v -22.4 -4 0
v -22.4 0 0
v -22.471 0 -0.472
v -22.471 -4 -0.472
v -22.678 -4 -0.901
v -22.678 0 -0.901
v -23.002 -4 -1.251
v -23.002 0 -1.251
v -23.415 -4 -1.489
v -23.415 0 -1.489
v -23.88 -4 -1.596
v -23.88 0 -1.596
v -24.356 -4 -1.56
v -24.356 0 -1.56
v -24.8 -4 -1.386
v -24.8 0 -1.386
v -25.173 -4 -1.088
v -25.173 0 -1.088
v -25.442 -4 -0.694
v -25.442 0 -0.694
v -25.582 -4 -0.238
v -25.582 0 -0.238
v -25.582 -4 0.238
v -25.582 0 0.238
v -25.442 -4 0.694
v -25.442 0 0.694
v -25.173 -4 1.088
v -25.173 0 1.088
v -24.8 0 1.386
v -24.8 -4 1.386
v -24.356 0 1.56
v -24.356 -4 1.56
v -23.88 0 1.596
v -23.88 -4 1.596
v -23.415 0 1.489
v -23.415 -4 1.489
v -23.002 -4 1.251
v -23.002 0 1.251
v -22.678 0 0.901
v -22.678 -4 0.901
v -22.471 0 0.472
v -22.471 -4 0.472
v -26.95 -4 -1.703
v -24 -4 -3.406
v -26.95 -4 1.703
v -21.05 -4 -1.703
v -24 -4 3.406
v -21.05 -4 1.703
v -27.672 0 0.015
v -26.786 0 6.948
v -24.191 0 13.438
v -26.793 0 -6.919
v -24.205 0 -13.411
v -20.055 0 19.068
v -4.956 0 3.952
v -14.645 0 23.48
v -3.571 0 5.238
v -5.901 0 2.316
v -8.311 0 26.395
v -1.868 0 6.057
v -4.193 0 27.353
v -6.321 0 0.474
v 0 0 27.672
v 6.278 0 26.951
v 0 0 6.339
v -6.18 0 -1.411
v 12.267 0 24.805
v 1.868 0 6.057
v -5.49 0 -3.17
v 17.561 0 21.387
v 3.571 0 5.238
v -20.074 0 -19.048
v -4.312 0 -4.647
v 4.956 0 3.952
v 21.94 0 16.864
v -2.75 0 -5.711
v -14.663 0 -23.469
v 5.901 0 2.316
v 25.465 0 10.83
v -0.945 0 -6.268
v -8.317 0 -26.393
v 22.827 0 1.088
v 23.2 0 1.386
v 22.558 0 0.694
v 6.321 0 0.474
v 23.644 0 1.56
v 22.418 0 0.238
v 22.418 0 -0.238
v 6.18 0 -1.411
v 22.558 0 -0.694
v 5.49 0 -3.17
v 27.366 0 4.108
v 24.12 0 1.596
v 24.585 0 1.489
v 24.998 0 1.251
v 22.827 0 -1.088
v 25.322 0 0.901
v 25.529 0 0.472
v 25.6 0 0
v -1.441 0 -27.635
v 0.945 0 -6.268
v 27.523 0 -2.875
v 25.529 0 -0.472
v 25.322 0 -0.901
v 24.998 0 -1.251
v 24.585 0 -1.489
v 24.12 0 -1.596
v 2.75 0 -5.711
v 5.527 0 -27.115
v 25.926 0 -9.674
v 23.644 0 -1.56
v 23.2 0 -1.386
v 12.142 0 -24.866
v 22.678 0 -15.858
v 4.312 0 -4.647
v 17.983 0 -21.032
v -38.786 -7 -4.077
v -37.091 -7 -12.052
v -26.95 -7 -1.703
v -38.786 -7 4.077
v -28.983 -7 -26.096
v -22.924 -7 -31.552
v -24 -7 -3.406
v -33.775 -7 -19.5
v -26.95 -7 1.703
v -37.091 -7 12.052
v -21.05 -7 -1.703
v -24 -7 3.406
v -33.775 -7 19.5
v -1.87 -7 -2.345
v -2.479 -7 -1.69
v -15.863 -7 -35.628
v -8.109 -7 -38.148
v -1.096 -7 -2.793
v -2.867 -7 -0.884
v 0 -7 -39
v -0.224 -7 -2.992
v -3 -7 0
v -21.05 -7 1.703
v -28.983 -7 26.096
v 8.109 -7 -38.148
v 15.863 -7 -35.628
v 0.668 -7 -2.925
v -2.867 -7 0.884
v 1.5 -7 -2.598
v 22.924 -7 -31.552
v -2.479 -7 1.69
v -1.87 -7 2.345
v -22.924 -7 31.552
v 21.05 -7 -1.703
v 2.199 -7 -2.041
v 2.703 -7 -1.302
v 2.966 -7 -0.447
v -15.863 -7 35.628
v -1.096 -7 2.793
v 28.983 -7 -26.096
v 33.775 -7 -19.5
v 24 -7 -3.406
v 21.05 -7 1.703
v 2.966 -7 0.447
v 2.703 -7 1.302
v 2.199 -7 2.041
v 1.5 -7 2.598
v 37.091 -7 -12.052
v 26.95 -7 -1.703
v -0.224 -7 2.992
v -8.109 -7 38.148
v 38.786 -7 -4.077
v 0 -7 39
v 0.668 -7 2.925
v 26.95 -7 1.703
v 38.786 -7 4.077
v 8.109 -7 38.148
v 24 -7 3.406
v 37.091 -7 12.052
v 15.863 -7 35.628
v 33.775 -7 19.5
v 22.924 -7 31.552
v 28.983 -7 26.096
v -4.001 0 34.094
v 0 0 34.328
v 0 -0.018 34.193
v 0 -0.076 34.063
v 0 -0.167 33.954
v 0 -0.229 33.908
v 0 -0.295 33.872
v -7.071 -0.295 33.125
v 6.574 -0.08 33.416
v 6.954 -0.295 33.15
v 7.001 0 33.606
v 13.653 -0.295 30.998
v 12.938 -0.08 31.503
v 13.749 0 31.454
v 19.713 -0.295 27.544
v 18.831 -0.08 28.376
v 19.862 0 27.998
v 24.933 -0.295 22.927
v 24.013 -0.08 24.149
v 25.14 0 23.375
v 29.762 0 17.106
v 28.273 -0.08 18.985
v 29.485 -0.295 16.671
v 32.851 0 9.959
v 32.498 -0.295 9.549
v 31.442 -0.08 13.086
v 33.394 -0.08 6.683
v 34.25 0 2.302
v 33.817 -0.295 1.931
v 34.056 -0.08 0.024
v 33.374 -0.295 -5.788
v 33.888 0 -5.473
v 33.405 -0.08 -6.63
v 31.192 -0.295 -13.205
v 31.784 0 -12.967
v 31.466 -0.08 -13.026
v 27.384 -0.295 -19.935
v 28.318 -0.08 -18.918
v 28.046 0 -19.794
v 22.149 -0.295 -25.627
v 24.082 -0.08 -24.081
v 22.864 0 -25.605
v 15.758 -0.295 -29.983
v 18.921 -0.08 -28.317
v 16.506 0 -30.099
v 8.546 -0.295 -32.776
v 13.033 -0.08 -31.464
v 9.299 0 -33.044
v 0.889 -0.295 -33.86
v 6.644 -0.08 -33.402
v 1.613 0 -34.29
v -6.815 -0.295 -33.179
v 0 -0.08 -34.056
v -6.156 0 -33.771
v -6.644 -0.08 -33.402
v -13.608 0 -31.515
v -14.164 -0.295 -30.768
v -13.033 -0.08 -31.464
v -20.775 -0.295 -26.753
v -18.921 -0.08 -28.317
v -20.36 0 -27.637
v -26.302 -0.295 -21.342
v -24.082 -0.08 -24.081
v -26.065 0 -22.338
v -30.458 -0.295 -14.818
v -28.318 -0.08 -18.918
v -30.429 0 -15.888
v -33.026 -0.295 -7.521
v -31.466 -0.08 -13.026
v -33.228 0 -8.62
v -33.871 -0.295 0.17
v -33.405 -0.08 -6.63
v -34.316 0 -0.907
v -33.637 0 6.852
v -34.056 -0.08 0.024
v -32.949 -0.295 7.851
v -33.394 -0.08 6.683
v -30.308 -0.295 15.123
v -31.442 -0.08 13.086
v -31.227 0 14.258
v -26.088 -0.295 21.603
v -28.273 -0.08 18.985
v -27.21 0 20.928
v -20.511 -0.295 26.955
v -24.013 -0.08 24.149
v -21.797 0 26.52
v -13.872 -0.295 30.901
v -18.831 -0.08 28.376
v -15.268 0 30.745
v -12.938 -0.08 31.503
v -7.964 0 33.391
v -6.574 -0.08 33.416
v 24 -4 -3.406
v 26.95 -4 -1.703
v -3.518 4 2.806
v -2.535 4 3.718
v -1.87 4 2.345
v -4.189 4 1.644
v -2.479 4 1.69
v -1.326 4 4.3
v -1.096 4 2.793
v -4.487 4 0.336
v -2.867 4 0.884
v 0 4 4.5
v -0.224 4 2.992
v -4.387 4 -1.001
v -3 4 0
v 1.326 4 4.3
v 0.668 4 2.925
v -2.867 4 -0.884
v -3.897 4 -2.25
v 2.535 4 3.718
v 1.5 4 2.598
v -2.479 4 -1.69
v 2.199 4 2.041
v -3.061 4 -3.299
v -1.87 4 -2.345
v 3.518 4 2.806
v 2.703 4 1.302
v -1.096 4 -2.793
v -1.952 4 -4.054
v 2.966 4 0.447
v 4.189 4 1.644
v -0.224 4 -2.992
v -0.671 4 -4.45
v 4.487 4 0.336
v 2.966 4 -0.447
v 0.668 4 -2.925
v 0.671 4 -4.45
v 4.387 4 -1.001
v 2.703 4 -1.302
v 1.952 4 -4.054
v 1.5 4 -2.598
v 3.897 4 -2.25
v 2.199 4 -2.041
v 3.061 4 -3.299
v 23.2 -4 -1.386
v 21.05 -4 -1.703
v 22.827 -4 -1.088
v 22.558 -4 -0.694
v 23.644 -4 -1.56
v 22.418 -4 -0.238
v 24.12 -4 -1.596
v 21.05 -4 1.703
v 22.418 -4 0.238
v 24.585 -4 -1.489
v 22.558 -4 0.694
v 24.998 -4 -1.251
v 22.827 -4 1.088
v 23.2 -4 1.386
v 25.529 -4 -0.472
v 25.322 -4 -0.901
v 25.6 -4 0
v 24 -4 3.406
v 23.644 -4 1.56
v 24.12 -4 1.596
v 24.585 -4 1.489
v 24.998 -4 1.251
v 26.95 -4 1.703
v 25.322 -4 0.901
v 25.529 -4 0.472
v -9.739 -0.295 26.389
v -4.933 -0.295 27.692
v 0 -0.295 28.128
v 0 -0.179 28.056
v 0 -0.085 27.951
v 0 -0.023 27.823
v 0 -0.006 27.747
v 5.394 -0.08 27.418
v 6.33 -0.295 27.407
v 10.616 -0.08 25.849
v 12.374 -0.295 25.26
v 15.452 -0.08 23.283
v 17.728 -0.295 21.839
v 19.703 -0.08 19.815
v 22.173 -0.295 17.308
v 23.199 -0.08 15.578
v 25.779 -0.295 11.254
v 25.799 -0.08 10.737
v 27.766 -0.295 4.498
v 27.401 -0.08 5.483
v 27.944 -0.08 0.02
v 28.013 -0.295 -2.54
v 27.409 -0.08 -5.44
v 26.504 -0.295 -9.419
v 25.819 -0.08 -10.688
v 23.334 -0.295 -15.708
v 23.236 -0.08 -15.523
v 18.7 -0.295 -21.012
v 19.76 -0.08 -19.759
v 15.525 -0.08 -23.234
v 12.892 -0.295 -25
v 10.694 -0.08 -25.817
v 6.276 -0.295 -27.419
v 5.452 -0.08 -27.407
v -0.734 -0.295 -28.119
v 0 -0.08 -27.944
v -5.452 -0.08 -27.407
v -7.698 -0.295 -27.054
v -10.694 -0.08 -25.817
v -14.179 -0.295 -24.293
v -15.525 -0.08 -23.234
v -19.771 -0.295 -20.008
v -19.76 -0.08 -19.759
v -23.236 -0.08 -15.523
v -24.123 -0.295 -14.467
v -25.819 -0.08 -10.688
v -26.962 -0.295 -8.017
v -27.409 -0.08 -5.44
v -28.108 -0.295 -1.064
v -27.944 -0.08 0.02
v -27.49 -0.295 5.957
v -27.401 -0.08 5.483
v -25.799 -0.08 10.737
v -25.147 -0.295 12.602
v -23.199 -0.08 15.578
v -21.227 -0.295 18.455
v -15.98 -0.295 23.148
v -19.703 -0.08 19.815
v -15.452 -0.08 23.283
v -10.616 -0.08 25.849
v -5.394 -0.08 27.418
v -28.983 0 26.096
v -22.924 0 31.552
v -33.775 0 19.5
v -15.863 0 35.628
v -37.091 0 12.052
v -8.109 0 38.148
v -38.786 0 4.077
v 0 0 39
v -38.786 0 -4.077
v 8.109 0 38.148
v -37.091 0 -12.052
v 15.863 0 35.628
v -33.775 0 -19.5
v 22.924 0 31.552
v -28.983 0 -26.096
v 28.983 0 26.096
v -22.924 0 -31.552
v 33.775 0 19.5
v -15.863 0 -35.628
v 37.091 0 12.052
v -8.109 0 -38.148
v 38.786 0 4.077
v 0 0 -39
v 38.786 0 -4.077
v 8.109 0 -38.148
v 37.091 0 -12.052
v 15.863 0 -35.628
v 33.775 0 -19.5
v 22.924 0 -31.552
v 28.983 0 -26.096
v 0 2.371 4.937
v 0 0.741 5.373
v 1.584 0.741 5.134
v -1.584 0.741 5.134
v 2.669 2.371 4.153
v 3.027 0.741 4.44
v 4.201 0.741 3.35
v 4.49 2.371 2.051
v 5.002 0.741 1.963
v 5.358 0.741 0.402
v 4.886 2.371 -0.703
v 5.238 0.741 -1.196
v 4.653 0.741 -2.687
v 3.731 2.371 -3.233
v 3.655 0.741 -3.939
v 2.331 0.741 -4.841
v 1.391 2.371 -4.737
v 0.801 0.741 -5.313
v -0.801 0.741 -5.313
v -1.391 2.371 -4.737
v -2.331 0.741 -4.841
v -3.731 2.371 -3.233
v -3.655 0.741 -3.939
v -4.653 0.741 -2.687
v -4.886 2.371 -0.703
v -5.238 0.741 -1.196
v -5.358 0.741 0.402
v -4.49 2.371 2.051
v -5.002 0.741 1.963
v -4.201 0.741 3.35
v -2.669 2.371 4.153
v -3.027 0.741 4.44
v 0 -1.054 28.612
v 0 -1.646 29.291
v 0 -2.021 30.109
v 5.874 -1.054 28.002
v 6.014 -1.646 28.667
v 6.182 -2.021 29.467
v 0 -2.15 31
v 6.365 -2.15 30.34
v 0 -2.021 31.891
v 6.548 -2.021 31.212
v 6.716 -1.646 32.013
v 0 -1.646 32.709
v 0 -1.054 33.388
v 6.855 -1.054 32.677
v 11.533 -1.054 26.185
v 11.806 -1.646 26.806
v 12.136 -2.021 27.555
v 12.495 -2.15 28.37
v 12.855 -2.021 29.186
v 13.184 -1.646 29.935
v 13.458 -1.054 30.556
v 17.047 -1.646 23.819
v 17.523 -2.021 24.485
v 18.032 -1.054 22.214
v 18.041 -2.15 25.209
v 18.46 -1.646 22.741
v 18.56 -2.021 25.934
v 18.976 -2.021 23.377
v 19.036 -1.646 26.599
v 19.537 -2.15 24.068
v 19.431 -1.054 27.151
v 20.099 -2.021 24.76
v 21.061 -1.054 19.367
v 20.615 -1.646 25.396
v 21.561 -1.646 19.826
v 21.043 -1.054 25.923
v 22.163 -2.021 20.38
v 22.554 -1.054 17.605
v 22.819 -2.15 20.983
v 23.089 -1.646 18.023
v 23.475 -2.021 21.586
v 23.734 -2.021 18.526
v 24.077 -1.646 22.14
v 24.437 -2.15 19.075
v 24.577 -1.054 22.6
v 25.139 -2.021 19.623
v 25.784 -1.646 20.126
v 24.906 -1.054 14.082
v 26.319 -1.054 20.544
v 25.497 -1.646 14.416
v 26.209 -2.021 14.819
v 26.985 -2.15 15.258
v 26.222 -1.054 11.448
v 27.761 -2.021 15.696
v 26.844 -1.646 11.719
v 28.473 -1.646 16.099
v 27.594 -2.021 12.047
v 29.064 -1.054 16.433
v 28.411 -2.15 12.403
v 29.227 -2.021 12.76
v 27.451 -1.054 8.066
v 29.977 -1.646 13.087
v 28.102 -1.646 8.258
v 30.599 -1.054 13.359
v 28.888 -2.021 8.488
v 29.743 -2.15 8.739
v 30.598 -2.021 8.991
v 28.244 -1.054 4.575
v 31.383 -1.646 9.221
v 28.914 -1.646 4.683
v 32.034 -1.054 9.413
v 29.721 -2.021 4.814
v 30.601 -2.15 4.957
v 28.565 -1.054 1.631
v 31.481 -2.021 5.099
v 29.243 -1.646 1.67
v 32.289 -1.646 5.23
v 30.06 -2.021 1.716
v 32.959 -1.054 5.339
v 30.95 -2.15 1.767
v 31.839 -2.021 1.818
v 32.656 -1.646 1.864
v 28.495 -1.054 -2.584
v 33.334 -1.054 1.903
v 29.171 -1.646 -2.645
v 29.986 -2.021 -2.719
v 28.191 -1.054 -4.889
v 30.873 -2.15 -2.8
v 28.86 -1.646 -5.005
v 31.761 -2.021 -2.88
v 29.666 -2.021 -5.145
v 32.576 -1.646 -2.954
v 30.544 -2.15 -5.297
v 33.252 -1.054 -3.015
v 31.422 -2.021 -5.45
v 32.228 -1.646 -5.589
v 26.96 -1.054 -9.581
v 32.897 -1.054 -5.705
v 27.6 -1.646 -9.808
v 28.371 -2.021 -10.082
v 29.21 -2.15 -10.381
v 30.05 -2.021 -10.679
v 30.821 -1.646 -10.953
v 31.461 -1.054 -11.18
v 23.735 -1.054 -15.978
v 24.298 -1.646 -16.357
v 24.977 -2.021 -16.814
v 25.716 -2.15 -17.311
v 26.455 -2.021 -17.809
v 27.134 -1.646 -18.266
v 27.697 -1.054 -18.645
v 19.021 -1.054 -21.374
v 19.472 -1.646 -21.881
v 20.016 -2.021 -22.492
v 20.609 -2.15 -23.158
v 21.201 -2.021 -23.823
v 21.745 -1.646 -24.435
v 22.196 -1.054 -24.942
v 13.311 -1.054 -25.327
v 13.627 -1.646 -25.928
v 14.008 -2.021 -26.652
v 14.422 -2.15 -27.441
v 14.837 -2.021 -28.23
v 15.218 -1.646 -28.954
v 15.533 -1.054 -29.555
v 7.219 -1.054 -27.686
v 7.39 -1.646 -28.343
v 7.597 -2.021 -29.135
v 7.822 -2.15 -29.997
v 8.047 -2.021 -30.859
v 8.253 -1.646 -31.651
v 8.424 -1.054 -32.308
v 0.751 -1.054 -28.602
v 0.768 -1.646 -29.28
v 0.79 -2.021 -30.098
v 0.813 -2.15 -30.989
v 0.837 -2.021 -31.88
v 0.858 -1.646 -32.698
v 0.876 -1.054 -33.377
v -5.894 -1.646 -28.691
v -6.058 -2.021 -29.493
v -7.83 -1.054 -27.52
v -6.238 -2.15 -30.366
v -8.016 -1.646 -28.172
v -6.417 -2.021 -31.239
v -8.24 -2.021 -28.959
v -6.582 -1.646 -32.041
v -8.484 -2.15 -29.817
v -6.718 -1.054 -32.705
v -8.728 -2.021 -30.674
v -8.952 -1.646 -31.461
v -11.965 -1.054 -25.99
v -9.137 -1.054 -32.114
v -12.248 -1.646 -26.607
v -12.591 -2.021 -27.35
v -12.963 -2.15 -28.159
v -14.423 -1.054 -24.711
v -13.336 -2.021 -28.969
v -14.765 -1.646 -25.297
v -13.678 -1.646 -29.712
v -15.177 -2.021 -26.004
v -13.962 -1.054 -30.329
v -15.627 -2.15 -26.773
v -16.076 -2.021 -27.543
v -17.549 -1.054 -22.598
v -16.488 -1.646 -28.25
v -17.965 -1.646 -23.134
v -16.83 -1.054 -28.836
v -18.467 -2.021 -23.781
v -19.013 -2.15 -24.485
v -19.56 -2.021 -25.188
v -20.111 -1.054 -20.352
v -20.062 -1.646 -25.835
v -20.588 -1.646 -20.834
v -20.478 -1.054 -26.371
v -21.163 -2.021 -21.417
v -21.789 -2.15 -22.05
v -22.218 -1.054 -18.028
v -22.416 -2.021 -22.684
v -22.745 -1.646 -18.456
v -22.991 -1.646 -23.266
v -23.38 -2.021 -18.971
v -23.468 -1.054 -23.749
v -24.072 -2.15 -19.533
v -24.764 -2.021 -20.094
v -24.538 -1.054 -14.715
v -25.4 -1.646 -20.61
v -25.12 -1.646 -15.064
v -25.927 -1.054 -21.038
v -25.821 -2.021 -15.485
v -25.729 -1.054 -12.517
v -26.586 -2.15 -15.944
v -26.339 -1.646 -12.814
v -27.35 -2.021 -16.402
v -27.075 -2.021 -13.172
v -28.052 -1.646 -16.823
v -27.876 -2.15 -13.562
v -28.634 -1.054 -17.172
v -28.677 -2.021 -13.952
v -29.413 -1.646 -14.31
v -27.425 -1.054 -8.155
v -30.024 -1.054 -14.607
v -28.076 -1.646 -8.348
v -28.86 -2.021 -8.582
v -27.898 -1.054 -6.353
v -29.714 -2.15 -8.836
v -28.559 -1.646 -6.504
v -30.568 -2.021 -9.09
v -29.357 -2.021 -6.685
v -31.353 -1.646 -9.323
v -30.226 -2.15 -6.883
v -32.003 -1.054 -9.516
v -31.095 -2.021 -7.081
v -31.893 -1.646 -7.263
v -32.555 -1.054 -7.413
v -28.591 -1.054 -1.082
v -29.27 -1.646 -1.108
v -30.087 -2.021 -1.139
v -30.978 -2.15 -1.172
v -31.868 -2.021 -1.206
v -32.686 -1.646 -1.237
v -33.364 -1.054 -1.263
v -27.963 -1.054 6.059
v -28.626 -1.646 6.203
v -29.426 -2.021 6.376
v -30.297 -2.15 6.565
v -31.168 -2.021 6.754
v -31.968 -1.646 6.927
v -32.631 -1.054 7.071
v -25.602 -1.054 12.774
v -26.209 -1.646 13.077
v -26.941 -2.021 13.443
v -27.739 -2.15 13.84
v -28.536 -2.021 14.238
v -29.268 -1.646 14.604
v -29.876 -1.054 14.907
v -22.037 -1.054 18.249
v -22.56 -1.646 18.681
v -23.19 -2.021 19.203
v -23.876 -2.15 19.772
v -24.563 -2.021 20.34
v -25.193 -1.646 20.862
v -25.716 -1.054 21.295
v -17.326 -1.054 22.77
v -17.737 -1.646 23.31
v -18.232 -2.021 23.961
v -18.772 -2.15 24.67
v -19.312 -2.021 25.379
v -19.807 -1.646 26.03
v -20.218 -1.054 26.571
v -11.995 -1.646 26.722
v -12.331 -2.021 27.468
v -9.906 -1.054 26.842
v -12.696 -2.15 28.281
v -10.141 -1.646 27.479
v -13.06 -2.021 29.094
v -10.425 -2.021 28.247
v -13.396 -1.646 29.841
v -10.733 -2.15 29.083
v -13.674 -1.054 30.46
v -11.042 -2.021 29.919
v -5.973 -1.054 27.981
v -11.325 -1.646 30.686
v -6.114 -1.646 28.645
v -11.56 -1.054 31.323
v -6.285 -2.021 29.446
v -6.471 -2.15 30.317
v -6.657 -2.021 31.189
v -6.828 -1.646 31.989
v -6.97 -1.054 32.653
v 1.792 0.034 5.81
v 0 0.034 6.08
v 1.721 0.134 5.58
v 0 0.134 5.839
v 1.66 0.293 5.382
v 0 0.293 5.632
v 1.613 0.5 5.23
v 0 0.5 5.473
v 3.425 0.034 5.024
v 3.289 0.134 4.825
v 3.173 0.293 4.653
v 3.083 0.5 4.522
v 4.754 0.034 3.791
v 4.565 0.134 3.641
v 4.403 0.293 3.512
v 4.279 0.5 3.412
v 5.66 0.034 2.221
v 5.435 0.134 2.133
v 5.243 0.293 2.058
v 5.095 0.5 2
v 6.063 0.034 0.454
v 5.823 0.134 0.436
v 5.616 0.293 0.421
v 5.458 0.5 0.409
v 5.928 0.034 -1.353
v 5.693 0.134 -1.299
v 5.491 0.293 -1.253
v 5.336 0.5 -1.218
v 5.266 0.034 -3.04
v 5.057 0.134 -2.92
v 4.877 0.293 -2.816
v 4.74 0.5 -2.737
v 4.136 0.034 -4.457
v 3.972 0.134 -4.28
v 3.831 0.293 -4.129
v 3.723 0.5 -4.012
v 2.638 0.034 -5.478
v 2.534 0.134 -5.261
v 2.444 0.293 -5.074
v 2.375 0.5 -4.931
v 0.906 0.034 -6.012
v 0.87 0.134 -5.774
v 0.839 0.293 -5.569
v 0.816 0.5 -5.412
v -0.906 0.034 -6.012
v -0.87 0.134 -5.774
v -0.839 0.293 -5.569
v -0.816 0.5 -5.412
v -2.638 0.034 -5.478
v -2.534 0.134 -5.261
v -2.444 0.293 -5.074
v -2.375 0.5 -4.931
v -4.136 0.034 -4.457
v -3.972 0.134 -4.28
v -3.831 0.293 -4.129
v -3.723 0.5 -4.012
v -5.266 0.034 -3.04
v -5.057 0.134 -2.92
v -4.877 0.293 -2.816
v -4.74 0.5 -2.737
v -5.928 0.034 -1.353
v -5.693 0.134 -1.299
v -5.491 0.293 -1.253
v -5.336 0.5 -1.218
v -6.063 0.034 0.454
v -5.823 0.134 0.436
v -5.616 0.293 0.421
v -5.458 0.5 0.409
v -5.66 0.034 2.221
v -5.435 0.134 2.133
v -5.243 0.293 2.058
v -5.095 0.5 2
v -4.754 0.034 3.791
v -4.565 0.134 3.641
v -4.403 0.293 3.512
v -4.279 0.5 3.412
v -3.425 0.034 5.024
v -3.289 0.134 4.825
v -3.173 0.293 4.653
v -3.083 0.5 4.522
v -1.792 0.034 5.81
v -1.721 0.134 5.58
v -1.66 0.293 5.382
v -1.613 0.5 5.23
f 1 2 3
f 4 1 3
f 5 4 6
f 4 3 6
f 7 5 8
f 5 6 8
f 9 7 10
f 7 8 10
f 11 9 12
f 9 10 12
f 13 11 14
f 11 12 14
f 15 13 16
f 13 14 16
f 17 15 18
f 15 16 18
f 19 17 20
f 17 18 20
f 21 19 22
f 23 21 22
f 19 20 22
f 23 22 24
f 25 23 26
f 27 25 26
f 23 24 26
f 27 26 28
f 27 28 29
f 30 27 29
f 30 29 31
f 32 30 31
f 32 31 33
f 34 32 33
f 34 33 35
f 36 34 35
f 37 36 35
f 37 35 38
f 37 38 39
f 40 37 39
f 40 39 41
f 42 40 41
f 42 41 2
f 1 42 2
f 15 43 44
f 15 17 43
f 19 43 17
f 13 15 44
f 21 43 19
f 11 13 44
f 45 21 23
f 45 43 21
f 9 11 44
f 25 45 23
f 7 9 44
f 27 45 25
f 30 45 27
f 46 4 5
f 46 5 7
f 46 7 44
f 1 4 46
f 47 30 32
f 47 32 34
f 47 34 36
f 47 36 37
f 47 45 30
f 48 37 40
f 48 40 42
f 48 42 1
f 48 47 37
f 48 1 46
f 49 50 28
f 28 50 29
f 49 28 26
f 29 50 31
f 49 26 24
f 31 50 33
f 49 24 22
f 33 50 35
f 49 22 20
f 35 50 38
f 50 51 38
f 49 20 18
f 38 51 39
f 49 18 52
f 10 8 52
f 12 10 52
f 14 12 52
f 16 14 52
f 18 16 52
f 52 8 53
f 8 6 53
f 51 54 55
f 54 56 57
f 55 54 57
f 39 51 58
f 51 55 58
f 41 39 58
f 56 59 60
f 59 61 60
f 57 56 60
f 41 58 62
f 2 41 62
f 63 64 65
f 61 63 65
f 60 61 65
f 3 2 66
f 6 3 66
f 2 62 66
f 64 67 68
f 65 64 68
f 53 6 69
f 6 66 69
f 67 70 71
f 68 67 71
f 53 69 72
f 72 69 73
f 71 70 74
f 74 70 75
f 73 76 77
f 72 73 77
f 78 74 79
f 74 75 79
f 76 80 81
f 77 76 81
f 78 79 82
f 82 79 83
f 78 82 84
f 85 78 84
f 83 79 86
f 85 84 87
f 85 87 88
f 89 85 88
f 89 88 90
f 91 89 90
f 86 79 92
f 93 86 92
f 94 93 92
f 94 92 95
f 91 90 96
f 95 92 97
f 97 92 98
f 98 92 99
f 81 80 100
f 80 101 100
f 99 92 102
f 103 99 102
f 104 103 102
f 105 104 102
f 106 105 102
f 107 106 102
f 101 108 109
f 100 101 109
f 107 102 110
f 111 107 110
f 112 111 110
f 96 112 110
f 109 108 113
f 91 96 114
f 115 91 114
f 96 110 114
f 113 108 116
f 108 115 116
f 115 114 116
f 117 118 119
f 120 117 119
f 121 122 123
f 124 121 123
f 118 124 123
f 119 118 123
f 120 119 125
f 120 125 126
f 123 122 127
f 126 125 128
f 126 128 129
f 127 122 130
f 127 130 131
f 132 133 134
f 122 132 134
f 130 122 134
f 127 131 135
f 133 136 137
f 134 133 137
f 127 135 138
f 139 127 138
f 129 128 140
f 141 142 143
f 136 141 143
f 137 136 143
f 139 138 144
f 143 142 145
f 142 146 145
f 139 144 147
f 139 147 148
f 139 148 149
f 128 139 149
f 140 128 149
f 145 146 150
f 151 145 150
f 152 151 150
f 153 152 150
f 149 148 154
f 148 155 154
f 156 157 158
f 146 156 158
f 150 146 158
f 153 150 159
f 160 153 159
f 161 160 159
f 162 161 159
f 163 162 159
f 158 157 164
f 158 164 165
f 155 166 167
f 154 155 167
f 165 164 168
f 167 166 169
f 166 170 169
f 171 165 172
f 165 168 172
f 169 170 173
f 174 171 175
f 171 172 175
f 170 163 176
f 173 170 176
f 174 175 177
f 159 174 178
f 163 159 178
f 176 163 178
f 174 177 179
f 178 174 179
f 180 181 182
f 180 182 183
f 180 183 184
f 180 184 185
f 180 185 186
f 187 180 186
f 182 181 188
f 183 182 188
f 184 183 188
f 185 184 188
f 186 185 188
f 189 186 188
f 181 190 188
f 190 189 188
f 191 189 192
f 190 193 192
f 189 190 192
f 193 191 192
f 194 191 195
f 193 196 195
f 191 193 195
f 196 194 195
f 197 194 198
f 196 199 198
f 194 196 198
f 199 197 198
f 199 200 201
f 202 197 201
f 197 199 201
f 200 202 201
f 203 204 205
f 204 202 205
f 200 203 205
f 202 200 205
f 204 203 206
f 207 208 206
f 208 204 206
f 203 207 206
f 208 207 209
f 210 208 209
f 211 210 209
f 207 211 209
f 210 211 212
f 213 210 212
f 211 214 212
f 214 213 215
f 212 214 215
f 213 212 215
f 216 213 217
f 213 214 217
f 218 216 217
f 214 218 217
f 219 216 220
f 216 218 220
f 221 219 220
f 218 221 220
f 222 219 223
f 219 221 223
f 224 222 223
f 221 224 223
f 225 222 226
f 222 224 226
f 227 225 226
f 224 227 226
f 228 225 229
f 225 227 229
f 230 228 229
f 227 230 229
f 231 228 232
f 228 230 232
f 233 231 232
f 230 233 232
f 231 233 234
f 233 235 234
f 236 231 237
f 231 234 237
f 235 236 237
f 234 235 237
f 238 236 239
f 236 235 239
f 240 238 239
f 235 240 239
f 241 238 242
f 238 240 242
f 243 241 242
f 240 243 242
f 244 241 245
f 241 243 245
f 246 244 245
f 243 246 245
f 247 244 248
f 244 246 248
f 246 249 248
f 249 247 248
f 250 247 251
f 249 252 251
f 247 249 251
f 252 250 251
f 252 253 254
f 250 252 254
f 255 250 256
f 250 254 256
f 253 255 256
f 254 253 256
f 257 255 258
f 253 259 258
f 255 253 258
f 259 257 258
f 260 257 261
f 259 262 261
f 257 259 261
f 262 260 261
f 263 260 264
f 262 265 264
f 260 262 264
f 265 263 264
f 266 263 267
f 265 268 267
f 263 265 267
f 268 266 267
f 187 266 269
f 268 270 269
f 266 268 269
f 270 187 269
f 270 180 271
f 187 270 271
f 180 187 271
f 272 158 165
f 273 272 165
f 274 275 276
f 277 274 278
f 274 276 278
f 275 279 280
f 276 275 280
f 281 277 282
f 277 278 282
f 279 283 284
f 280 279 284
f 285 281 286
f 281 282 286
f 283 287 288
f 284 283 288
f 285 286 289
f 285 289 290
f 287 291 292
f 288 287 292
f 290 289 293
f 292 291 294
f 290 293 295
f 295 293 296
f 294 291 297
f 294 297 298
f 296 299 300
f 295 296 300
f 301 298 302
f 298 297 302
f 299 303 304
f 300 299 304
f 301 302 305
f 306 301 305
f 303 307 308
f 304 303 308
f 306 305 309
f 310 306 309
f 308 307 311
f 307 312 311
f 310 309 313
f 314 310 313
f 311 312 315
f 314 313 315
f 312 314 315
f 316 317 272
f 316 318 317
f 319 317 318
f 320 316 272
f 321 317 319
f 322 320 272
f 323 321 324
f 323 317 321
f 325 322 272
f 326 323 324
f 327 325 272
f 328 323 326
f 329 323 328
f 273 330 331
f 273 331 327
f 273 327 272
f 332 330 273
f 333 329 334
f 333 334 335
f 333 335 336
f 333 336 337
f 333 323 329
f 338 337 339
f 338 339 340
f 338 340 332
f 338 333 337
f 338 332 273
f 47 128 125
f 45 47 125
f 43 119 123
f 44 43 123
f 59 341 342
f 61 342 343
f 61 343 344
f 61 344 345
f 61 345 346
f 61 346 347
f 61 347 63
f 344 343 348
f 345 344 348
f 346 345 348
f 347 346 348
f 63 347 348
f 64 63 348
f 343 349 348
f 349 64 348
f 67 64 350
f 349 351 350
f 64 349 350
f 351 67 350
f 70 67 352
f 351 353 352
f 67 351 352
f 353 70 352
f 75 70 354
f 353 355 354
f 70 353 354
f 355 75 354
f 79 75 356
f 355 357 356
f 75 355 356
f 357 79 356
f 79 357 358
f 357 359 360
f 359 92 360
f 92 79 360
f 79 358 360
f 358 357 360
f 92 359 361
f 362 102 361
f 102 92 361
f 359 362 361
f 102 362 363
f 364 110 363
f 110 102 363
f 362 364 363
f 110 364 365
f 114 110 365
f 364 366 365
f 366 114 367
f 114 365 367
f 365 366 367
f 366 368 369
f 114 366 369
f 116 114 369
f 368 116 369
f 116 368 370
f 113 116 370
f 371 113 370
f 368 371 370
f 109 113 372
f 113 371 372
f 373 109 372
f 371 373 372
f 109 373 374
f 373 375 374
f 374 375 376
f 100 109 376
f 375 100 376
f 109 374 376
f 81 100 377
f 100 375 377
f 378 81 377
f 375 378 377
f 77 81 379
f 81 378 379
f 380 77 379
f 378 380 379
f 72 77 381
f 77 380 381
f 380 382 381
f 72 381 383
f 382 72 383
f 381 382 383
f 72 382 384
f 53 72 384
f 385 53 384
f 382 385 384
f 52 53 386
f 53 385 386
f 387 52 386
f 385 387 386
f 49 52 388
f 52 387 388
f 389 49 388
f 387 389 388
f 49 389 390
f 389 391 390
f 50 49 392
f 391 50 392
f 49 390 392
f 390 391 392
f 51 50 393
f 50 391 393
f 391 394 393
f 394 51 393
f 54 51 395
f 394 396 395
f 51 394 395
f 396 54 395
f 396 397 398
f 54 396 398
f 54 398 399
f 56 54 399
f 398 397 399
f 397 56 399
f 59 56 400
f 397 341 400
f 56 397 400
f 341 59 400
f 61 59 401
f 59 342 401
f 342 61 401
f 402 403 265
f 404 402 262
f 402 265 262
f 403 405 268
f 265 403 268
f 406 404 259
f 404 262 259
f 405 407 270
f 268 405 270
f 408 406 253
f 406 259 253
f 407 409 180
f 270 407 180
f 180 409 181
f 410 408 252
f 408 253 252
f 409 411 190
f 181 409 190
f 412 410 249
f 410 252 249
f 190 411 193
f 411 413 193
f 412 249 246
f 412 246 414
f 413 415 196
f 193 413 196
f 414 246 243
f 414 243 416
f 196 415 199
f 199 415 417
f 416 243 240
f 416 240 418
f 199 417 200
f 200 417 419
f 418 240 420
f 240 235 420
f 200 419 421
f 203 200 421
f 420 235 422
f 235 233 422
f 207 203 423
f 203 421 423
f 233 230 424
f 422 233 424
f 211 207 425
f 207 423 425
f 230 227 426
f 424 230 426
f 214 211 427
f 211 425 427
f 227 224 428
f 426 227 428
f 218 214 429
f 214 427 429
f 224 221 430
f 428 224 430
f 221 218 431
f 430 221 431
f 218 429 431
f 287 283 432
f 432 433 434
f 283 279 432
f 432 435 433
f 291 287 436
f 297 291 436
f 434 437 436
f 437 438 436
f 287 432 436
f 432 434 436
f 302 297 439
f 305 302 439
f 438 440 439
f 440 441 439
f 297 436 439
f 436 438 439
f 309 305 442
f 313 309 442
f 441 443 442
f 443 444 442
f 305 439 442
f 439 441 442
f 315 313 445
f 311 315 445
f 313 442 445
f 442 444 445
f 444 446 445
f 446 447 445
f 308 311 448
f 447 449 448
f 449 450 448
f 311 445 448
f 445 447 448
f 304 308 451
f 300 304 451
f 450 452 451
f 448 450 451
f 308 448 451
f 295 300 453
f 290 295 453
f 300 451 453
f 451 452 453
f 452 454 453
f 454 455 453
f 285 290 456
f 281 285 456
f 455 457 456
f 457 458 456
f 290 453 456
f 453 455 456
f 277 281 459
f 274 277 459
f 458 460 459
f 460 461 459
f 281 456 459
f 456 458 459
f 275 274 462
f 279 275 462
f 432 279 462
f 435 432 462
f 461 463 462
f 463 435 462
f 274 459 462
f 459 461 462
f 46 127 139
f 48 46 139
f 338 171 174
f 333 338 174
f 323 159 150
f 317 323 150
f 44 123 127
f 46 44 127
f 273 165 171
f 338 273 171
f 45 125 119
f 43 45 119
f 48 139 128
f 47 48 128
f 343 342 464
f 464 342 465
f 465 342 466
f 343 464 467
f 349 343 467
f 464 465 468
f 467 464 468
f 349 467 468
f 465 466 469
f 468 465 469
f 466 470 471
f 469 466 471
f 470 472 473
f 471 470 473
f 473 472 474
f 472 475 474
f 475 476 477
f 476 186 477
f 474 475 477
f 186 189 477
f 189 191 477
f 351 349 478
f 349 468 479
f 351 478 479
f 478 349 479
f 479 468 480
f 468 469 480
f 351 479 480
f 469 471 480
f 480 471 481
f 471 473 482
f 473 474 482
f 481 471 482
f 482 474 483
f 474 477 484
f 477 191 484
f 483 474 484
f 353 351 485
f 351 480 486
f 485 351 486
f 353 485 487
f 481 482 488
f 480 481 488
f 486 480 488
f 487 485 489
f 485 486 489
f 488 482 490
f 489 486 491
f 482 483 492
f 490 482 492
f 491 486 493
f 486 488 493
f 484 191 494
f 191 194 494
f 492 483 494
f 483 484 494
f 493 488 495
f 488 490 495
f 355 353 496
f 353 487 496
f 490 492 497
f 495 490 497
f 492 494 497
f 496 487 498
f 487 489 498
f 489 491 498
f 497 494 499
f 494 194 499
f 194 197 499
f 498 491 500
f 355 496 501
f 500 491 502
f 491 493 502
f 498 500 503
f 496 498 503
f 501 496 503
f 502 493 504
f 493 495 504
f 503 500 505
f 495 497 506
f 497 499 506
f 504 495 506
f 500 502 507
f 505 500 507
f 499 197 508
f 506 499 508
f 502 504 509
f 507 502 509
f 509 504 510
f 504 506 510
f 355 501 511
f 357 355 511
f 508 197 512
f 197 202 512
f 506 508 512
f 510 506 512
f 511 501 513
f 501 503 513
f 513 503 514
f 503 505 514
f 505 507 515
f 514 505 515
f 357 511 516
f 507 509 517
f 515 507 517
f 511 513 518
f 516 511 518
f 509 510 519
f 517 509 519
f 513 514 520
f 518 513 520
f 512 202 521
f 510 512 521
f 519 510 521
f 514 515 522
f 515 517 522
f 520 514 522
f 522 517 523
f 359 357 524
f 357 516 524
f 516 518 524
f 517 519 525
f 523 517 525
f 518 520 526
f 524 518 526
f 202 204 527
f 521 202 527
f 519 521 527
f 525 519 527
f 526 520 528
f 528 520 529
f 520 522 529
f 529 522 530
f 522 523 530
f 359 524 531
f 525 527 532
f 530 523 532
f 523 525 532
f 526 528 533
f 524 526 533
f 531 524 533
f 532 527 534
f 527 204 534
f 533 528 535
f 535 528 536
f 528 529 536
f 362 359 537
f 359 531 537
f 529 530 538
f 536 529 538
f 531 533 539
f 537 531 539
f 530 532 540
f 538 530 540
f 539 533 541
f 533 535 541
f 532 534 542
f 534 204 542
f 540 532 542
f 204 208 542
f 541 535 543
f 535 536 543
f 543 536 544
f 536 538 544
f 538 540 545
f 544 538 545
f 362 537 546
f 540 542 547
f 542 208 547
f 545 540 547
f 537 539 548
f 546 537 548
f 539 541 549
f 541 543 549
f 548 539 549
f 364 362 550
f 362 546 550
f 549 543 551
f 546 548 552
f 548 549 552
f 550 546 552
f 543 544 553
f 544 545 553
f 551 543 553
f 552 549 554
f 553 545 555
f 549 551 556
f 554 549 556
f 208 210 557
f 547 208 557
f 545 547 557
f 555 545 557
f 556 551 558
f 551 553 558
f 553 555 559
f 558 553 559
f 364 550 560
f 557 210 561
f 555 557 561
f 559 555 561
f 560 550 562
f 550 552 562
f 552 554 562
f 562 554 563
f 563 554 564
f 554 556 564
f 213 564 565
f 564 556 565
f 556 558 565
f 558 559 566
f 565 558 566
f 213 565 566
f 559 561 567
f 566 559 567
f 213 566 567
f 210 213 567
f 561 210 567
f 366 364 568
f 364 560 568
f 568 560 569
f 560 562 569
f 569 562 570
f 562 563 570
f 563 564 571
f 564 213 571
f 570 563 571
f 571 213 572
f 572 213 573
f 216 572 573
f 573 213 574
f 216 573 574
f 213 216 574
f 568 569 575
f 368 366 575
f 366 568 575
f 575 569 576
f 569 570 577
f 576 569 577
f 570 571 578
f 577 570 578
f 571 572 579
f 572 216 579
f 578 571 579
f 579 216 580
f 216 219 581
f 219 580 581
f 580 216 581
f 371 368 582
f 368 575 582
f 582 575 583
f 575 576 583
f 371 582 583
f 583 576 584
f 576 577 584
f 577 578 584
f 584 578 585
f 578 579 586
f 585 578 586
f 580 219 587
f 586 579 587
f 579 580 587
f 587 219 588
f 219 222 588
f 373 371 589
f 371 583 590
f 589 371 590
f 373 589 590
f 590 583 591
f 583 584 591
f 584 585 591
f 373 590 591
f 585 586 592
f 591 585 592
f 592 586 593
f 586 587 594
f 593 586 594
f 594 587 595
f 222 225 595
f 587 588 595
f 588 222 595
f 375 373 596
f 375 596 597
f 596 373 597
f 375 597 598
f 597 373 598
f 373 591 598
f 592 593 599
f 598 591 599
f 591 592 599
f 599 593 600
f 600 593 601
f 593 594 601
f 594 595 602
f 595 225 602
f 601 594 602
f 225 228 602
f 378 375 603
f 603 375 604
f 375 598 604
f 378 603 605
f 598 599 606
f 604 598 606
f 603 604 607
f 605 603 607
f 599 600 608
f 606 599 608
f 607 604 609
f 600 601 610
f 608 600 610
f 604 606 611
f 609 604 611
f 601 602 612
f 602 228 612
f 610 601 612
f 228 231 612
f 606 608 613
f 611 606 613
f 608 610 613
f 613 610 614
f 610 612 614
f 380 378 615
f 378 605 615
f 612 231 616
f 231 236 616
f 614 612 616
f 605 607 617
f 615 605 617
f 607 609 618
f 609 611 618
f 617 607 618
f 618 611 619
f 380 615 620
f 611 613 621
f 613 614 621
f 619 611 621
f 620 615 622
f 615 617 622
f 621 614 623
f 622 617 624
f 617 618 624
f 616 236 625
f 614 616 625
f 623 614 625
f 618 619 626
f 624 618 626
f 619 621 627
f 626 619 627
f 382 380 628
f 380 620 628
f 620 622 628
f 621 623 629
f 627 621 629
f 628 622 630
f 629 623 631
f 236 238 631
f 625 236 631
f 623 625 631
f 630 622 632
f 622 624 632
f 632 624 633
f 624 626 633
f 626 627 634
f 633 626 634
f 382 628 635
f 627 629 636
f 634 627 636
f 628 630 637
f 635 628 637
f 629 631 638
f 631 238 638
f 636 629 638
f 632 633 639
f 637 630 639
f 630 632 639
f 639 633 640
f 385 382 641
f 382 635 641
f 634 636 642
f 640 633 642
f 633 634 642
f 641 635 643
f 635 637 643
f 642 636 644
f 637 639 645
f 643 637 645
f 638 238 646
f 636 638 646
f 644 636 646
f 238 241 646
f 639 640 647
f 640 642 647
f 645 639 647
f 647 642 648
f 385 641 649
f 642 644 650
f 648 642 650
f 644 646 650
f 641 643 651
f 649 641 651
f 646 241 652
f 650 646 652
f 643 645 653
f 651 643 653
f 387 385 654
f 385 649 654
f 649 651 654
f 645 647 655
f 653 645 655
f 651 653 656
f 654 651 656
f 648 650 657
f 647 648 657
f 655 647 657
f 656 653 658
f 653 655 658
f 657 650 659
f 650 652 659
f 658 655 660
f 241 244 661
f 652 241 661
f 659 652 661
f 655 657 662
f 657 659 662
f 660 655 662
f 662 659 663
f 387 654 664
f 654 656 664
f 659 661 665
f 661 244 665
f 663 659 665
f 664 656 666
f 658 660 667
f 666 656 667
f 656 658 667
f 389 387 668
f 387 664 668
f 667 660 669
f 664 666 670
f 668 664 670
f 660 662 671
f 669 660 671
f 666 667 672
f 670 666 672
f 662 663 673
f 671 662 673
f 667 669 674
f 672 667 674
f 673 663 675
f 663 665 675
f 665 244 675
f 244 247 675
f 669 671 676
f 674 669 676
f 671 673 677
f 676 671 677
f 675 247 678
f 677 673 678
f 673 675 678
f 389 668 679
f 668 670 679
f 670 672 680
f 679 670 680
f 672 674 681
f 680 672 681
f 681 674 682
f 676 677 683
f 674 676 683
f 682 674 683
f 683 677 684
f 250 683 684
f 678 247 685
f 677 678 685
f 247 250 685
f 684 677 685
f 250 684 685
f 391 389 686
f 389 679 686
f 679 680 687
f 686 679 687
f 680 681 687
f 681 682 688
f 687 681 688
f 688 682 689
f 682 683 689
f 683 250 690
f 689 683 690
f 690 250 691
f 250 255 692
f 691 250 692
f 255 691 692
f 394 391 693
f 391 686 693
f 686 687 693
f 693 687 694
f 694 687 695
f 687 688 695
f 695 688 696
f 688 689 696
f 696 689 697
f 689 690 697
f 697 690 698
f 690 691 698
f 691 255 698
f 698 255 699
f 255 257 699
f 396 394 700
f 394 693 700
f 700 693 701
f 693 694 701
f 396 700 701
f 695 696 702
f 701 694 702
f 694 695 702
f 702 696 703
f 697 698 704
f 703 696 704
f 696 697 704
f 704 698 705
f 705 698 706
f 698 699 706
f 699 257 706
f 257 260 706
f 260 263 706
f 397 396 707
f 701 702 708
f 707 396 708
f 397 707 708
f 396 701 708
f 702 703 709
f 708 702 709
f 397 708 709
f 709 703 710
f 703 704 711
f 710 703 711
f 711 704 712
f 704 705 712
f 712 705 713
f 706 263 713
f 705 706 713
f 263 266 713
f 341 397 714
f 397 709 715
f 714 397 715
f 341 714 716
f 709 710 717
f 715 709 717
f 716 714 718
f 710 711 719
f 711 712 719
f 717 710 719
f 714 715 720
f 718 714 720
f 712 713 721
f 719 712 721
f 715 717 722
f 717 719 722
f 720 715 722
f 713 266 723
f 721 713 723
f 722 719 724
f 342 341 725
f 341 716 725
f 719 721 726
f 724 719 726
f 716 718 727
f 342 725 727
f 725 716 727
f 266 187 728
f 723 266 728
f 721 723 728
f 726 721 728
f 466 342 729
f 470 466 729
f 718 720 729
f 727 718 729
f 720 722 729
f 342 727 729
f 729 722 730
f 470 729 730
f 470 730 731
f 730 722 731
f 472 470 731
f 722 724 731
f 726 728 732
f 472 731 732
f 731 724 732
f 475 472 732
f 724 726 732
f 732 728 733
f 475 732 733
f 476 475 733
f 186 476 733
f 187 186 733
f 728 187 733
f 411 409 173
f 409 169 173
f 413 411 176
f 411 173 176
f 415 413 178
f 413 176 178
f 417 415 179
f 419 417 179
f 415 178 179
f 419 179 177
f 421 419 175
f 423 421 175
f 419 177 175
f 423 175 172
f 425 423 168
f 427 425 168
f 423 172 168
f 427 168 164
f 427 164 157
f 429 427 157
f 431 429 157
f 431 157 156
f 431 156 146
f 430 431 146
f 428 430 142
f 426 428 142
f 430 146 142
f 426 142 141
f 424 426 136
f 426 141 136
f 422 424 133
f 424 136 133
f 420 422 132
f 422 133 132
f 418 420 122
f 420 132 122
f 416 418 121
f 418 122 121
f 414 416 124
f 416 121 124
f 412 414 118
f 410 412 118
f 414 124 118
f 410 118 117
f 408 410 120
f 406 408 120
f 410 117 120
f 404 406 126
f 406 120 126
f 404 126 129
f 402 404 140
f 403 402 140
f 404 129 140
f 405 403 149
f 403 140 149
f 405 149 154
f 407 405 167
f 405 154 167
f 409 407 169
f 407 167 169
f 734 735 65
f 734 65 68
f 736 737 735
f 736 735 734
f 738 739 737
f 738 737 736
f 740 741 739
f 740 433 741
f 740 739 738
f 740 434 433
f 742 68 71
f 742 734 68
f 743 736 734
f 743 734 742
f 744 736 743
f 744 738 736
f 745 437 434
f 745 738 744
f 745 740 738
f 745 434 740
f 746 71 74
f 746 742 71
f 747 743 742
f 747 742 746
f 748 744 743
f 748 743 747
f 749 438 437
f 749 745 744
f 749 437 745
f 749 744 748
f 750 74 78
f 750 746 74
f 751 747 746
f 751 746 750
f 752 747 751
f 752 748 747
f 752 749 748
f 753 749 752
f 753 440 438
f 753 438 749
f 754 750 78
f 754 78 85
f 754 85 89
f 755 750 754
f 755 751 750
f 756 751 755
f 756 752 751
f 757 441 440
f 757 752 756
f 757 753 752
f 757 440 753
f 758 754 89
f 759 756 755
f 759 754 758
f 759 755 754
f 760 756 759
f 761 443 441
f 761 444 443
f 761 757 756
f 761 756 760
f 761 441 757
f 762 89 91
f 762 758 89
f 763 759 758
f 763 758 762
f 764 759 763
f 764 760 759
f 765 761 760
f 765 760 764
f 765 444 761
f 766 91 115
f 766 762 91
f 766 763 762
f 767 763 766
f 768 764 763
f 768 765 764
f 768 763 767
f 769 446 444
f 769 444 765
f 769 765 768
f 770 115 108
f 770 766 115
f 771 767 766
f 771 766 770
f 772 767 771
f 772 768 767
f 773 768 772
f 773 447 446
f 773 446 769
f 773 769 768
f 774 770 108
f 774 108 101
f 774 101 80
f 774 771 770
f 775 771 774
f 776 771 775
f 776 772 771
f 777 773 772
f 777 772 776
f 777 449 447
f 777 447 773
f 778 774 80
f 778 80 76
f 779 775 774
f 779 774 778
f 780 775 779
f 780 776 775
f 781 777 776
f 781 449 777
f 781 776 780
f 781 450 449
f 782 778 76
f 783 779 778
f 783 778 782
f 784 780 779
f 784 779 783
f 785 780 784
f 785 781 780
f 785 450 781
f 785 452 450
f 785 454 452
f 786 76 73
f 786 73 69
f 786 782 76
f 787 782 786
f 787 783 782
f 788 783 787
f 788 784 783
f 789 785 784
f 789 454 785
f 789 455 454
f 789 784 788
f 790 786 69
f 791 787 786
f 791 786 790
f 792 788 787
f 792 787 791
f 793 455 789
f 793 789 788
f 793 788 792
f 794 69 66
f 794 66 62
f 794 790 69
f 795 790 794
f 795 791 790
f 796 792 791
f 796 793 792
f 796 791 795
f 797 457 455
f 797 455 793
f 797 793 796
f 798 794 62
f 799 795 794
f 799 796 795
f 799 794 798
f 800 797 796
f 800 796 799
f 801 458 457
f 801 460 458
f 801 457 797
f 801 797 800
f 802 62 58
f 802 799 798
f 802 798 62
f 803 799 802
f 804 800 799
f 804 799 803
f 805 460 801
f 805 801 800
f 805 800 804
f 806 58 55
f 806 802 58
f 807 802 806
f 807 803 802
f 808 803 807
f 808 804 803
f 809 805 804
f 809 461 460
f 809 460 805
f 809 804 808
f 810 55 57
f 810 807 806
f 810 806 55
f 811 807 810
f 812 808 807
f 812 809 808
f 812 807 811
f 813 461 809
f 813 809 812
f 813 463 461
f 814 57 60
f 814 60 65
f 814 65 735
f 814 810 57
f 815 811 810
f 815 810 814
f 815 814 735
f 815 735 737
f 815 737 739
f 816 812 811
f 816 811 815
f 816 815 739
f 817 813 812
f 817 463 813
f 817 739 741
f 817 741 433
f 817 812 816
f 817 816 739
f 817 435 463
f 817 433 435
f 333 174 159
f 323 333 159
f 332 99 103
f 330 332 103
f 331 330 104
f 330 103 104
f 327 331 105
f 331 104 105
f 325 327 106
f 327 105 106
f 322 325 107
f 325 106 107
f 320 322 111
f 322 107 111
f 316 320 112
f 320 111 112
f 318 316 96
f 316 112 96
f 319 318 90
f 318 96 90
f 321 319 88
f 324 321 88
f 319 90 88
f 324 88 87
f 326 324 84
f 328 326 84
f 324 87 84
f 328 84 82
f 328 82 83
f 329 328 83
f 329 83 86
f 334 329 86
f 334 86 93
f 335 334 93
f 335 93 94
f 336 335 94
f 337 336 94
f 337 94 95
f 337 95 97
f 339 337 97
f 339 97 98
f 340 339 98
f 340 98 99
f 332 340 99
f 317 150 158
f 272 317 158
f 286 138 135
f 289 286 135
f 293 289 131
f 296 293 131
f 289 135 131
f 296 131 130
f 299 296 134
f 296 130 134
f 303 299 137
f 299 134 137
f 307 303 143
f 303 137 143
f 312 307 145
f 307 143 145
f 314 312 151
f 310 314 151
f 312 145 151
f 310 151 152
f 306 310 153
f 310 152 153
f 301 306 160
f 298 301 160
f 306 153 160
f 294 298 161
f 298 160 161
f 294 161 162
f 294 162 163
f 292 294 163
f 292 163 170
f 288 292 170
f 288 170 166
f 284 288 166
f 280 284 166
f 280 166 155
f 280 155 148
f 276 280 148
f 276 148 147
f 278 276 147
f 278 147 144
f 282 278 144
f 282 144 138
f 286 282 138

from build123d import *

# Parameters (mm, degrees)
CUT_EXTRUDE26_DEPTH            = 3
CUT_EXTRUDE27_DEPTH            = 3
F_6_0_6_DIAMETER_HOLE1_D       = 6
F_3_2_3_2_DIAMETER_HOLE1_D     = 3.2
F_3_2_3_2_DIAMETER_HOLE1_DEPTH = 8
FILLET2_R                      = 0.5
FILLET3_R                      = 1


with BuildPart() as part:
    # Sketch1 → Revolve1 (revolve)
    with BuildSketch(Plane(origin=(0, 0, 0), x_dir=(-1, 0, 0), z_dir=(0, 0, -1))):
        with BuildLine():
            Line((-39, -7), (0, -7))
            Line((0, -7), (0, 0))
            Line((0, 0), (-28.012944594, 0))
            ThreePointArc((-28.012944594, 0), (-31, -2.15), (-33.987055406, 0))
            Line((-33.987055406, 0), (-39, 0))
            Line((-39, 0), (-39, -7))
        make_face()
    revolve(axis=Axis((0, -7, 0), (0, 1, 0)))

    # Sketch27 → Cut-Extrude26 (cut)
    with BuildSketch(Plane.XZ.offset(7)):
        Polygon((26.95, -1.703183294), (26.95, 1.703183294), (24, 3.406366588), (21.05, 1.703183294), (21.05, -1.703183294), (24, -3.406366588), align=None)
    extrude(amount=-CUT_EXTRUDE26_DEPTH, mode=Mode.SUBTRACT)

    # Sketch28 → Cut-Extrude27 (cut)
    with BuildSketch(Plane.XZ.offset(7)):
        Polygon((-21.05, 1.703183294), (-24, 3.406366588), (-26.95, 1.703183294), (-26.95, -1.703183294), (-24, -3.406366588), (-21.05, -1.703183294), align=None)
    extrude(amount=-CUT_EXTRUDE27_DEPTH, mode=Mode.SUBTRACT)

    # Sketch29 → Revolve2 (revolve)
    with BuildSketch(Plane(origin=(0, 0, 0), x_dir=(-1, 0, 0), z_dir=(0, 0, -1))):
        Polygon((-5.57179677, 0), (0, 0), (0, 4), (-4.5, 4), align=None)
    revolve(axis=Axis((0, 0, 0), (0, 1, 0)))

    # Ø6.0 (6) Diameter Hole1 (through all)
    with Locations(Plane(origin=(0, 4, 0), x_dir=(1, 0, 0), z_dir=(0, 1, 0))):
        with Locations((0, 0)):
            Hole(F_6_0_6_DIAMETER_HOLE1_D / 2)

    # Ø3.2 (3.2) Diameter Hole1
    with Locations(Plane(origin=(0, -4, 0), x_dir=(-1, 0, 0), z_dir=(0, -1, 0))):
        with Locations((24, 0), (-24, 0)):
            Hole(F_3_2_3_2_DIAMETER_HOLE1_D / 2, depth=F_3_2_3_2_DIAMETER_HOLE1_DEPTH)

    # Fillet2
    fillet2_edges = [part.edges().sort_by_distance(p)[0] for p in [
        (-33.987055406, 0, 0),
        (-28.012944594, 0, 0),
    ]]
    fillet(fillet2_edges, radius=FILLET2_R)

    # Fillet3
    fillet3_edges = [part.edges().sort_by_distance(p)[0] for p in [
        (-5.57179677, 0, 0),
    ]]
    fillet(fillet3_edges, radius=FILLET3_R)


solid = part.part
